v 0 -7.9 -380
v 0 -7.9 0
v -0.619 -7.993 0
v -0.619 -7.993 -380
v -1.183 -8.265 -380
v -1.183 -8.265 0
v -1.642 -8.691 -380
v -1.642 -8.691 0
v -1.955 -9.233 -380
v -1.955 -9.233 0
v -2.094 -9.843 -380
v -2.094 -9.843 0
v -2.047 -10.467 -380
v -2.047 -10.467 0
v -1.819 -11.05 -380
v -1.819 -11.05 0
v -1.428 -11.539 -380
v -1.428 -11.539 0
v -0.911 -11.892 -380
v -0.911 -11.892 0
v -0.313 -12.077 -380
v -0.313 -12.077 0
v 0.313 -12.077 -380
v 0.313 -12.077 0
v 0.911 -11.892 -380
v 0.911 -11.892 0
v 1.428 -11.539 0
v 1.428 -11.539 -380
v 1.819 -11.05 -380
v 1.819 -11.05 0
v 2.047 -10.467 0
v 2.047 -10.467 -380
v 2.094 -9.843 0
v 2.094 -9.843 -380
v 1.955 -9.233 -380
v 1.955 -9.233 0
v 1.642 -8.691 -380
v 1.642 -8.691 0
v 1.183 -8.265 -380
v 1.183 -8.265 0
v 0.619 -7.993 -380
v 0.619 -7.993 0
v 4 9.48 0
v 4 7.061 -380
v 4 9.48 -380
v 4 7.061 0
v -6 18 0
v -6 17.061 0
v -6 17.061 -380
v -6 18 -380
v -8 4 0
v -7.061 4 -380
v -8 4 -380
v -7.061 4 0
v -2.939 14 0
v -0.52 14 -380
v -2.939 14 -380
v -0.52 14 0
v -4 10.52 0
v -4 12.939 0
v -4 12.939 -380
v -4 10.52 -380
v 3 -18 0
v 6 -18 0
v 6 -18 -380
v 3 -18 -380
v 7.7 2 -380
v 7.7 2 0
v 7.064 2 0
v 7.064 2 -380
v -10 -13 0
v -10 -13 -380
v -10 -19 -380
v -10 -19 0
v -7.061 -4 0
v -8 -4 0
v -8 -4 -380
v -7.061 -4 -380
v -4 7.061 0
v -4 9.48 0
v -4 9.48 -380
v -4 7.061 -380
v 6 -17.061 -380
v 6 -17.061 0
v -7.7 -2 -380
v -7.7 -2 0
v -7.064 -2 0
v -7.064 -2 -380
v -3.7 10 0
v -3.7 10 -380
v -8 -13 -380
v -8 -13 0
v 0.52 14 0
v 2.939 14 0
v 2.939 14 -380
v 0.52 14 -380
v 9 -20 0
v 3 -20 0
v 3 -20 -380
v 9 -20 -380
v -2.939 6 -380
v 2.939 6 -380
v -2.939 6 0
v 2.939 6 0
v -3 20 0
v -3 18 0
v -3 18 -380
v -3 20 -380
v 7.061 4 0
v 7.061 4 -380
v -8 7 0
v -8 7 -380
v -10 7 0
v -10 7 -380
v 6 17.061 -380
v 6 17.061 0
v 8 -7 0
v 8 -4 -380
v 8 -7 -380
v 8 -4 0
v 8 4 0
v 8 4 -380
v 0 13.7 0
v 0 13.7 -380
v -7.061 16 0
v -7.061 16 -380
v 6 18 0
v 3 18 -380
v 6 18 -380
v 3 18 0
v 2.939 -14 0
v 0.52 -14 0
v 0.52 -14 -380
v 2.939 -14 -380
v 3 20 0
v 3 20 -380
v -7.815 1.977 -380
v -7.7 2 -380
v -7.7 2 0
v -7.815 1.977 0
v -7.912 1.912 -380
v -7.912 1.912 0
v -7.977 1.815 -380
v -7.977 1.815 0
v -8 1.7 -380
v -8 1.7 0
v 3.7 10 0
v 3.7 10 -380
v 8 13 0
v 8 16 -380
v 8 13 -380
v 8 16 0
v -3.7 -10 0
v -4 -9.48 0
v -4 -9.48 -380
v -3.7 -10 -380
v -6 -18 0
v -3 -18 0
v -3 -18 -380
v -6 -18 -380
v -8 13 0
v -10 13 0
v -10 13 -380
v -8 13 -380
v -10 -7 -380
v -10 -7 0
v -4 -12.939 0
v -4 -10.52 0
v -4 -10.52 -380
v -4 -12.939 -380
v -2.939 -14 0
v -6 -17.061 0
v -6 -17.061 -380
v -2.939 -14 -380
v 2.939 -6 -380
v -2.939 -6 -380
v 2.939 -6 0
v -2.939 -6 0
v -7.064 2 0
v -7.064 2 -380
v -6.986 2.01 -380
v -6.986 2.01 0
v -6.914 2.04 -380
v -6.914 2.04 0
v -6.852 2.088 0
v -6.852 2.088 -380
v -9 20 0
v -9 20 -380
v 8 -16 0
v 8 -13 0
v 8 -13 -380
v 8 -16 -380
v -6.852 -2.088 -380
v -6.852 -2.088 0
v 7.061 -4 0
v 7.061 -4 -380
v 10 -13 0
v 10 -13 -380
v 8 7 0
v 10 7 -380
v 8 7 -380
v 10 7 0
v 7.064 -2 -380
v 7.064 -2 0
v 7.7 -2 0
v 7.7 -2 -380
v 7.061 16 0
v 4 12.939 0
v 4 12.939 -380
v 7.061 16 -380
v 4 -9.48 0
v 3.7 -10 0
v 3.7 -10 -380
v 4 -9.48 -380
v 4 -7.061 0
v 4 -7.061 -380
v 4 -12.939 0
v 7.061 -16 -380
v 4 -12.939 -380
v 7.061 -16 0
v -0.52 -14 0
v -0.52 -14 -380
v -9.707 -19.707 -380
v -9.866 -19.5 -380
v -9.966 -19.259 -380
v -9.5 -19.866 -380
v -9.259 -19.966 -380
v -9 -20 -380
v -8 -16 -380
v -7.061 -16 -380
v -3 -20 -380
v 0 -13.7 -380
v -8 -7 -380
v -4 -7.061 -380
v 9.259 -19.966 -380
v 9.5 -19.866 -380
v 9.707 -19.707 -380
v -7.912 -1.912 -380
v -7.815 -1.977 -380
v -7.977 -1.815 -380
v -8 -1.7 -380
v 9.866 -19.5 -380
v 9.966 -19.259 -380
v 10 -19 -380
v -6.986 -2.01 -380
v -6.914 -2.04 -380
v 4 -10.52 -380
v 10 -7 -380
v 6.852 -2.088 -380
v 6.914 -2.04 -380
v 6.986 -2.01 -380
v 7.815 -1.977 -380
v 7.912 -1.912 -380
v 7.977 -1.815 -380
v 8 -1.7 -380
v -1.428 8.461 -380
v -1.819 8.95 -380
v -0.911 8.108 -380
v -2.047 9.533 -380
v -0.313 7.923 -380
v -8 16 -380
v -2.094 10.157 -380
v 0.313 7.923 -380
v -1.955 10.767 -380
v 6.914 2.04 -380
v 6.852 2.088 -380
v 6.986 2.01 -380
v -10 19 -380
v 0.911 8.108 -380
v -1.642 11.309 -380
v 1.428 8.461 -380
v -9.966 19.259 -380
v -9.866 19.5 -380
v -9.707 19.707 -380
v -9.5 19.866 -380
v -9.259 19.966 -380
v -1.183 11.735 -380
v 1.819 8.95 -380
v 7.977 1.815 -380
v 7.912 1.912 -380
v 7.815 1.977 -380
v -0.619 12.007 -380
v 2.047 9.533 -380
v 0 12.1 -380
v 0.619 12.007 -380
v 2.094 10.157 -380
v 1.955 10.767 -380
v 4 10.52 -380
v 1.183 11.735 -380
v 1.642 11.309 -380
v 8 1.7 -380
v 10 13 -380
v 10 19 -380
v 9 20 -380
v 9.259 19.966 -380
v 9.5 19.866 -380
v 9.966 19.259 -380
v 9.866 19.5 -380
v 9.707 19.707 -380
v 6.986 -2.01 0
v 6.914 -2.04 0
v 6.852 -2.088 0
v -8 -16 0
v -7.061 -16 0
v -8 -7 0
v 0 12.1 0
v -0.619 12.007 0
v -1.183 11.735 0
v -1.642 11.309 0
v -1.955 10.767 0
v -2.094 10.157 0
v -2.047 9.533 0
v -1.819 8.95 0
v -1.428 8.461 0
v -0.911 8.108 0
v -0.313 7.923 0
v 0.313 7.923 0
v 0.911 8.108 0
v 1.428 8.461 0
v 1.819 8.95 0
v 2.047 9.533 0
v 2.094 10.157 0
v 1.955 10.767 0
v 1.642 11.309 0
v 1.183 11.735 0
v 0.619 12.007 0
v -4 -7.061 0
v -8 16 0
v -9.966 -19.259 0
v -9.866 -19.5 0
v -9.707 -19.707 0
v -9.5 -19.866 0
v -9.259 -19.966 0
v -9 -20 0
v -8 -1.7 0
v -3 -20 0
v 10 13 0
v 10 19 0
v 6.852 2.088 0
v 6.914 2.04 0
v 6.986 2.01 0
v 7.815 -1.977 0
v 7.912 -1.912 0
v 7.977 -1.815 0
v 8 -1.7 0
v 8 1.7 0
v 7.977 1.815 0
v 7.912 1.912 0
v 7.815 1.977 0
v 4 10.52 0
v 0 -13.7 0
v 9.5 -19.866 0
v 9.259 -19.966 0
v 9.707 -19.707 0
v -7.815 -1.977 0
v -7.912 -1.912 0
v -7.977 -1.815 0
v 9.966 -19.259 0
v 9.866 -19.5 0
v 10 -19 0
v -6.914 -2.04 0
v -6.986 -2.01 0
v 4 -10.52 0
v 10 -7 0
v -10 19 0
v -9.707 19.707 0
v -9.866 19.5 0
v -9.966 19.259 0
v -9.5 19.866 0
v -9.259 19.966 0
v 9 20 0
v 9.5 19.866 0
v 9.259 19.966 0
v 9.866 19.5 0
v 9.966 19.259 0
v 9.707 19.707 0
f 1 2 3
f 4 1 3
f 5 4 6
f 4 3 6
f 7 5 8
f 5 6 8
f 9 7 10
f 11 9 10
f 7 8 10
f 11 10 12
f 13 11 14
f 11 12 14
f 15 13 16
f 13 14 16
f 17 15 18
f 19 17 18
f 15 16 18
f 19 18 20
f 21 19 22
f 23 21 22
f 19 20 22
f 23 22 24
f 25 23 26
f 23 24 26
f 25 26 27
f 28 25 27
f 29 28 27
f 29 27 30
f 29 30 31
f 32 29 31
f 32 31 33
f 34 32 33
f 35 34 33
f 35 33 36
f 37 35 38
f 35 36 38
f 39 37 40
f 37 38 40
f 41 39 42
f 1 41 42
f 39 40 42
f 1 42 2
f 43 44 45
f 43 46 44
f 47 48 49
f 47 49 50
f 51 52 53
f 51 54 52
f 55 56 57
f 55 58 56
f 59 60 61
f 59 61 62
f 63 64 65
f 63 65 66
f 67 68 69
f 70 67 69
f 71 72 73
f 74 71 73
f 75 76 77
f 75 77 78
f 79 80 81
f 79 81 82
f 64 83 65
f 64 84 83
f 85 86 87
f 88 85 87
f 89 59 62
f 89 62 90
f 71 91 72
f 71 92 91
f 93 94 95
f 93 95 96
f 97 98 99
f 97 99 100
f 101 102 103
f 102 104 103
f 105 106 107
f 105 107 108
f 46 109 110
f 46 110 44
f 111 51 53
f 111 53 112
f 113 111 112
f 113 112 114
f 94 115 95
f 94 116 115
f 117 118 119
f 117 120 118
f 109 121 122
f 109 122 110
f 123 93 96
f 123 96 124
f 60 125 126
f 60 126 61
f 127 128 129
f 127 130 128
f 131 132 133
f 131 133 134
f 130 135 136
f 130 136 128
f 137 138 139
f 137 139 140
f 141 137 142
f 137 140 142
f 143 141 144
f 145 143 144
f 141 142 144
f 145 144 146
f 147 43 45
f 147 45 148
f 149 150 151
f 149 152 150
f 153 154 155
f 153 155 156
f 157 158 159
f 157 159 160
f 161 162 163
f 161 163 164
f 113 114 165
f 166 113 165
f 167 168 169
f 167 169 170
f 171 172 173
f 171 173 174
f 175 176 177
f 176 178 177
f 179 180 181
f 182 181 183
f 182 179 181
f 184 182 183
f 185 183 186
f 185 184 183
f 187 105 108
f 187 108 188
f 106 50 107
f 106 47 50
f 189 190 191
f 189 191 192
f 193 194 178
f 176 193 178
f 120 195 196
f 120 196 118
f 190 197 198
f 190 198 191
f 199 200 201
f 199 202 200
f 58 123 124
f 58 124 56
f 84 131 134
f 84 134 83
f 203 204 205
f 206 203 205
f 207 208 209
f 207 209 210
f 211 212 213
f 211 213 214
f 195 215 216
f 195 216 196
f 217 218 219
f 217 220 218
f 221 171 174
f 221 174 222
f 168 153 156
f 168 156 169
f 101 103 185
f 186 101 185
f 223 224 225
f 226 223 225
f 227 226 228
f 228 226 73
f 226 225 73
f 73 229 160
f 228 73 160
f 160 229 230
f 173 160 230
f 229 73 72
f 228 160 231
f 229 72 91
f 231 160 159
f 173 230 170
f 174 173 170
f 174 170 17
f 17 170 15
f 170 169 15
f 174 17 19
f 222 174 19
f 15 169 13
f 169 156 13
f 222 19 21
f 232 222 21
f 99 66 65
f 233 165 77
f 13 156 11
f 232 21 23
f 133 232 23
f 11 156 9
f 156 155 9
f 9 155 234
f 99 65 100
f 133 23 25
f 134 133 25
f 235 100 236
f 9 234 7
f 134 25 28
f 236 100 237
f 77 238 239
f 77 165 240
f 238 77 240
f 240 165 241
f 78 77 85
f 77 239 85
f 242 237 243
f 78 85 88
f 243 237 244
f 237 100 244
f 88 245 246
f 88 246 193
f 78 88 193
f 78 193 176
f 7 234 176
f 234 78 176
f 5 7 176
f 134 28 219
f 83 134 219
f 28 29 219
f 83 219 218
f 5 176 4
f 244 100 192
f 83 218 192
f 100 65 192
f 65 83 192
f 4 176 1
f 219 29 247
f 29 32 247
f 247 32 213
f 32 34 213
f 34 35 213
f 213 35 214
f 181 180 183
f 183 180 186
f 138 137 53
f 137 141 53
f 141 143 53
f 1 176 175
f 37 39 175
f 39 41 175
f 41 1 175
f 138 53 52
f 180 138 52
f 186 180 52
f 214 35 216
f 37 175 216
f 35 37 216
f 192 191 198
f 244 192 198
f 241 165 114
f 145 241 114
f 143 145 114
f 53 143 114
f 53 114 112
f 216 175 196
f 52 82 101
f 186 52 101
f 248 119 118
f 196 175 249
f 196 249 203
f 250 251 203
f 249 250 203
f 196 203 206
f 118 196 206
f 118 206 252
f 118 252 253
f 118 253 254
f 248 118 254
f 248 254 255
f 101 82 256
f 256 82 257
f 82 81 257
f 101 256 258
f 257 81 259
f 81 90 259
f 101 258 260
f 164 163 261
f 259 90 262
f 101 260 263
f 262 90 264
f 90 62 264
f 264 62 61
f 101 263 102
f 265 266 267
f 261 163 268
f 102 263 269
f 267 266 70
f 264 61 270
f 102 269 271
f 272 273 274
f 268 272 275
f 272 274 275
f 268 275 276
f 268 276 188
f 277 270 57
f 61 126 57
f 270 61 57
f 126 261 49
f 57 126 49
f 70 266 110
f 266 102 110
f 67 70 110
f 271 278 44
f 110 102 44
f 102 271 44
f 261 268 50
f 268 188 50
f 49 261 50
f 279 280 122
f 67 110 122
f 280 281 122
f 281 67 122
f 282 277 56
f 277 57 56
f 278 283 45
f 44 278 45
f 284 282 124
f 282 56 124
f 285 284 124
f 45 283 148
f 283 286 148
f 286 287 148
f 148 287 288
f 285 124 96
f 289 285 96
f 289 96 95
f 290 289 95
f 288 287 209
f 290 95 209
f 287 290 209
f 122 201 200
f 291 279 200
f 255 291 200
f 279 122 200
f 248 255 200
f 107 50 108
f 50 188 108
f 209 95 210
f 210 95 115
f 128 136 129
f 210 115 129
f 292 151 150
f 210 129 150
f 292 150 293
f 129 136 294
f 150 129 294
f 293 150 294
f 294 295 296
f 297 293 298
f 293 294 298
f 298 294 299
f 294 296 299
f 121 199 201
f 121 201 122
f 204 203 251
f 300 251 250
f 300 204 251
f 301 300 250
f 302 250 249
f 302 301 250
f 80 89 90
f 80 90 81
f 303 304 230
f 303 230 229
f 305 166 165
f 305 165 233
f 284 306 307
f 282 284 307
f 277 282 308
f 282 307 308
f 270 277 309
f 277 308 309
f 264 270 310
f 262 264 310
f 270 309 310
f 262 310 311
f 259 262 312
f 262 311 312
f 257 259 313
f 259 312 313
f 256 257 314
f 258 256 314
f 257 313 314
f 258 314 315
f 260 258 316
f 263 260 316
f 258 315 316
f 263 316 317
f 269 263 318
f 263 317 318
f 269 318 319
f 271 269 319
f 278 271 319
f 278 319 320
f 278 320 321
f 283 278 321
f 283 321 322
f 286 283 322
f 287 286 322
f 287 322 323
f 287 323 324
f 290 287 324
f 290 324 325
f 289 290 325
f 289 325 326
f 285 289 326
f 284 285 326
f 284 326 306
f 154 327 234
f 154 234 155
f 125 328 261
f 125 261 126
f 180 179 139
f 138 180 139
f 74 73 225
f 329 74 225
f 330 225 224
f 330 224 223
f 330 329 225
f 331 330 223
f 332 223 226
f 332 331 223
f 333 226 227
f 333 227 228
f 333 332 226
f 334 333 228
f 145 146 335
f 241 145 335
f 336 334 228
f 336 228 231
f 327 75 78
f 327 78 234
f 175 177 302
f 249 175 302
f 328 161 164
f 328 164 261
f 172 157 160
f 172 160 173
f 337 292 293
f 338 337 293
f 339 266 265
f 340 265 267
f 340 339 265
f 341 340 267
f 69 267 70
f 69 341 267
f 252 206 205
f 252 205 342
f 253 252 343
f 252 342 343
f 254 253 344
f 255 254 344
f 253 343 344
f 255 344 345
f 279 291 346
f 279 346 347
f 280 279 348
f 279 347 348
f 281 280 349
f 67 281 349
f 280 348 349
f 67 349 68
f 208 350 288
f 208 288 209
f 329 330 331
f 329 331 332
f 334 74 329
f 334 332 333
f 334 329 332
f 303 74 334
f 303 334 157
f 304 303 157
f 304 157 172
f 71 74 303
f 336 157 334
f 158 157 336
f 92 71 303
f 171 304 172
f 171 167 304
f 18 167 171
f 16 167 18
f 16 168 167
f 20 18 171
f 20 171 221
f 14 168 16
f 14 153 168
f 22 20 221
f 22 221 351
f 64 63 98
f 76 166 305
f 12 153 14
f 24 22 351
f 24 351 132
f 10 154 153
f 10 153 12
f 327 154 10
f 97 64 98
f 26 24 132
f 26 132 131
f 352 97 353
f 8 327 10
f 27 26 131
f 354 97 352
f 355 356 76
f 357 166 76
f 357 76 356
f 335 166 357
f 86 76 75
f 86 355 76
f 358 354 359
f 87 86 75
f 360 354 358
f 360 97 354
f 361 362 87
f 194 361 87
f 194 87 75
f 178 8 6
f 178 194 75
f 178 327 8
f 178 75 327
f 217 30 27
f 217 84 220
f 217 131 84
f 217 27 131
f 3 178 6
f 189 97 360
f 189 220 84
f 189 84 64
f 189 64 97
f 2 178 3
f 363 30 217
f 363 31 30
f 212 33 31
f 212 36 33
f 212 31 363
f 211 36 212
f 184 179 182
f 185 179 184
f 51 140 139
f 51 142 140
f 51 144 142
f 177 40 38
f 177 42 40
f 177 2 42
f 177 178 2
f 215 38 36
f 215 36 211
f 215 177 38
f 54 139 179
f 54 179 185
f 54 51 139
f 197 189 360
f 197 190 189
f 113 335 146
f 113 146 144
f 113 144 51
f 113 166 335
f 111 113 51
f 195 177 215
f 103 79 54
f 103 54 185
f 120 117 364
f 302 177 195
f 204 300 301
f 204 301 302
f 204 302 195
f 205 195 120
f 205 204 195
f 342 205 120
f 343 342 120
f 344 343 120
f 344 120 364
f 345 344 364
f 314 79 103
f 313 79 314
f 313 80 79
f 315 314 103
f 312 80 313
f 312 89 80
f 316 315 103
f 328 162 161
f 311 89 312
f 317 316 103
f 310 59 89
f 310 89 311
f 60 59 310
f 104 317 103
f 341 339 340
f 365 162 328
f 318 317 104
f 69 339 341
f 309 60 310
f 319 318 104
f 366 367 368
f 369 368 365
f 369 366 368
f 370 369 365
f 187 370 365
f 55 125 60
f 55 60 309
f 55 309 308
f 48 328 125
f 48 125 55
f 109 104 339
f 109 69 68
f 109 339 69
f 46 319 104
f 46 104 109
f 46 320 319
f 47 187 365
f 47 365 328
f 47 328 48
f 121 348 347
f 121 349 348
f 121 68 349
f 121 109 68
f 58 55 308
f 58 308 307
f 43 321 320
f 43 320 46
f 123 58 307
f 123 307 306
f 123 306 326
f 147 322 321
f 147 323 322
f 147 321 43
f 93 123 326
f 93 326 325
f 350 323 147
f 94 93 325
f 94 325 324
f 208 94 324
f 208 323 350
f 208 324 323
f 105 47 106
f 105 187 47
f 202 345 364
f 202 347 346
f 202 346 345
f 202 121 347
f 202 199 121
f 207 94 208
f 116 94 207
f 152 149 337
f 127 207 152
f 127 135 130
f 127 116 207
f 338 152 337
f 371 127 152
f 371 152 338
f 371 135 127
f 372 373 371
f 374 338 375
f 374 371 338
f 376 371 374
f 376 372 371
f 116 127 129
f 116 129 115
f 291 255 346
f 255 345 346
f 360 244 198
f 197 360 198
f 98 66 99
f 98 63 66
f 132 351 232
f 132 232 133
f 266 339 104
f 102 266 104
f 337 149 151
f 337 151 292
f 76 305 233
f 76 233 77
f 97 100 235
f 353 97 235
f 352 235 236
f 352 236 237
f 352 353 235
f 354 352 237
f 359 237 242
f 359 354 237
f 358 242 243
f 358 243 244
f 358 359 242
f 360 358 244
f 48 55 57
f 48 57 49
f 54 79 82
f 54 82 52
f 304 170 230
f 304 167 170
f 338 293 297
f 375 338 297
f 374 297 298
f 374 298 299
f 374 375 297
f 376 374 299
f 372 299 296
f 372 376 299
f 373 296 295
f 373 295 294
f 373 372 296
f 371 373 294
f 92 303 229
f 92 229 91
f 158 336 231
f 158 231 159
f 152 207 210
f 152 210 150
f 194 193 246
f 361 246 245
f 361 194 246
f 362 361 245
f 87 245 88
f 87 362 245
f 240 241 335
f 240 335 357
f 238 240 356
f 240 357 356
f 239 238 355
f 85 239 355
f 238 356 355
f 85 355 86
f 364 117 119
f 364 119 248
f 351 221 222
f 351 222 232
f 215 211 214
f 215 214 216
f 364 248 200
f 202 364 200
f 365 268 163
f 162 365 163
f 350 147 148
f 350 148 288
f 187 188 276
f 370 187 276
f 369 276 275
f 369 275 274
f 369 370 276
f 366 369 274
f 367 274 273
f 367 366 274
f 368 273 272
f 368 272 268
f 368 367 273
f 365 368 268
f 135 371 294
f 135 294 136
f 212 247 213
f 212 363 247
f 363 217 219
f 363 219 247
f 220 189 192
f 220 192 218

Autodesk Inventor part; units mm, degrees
sketch "Sketch_1" plane through (0, 0, 0) normal (0, 0, 1) x (1, 0, 0)
  line L0 (-10, -7) -> (-8, -7)
  line L1 (-8, -7) -> (-8, -4)
  line L2 (-8, -4) -> (-7.0607, -4)
  line L3 (-7.0607, -4) -> (-4, -7.0607)
  line L4 (-4, -7.0607) -> (-4, -9.4804)
  line L5 (-4, -9.4804) -> (-3.7, -10)
  line L6 (-3.7, -10) -> (-4, -10.5196)
  line L7 (-4, -10.5196) -> (-4, -12.9393)
  line L8 (-4, -12.9393) -> (-7.0607, -16)
  line L9 (-7.0607, -16) -> (-8, -16)
  line L10 (-8, -16) -> (-8, -13)
  line L11 (-8, -13) -> (-10, -13)
  line L12 (-10, -13) -> (-10, -19)
  arc A0 (-10, -19) -> (-9, -20) centre (-9, -19) ccw
  line L13 (-9, -20) -> (-3, -20)
  line L14 (-3, -20) -> (-3, -18)
  line L15 (-3, -18) -> (-6, -18)
  line L16 (-6, -18) -> (-6, -17.0607)
  line L17 (-6, -17.0607) -> (-2.9393, -14)
  line L18 (-2.9393, -14) -> (-0.5196, -14)
  line L19 (-0.5196, -14) -> (0, -13.7)
  line L20 (0, -13.7) -> (0.5196, -14)
  line L21 (0.5196, -14) -> (2.9393, -14)
  line L22 (2.9393, -14) -> (6, -17.0607)
  line L23 (6, -17.0607) -> (6, -18)
  line L24 (6, -18) -> (3, -18)
  line L25 (3, -18) -> (3, -20)
  line L26 (3, -20) -> (9, -20)
  arc A1 (9, -20) -> (10, -19) centre (9, -19) ccw
  line L27 (10, -19) -> (10, -13)
  line L28 (10, -13) -> (8, -13)
  line L29 (8, -13) -> (8, -16)
  line L30 (8, -16) -> (7.0607, -16)
  line L31 (7.0607, -16) -> (4, -12.9393)
  line L32 (4, -12.9393) -> (4, -10.5196)
  line L33 (4, -10.5196) -> (3.7, -10)
  line L34 (3.7, -10) -> (4, -9.4804)
  line L35 (4, -9.4804) -> (4, -7.0607)
  line L36 (4, -7.0607) -> (7.0607, -4)
  line L37 (7.0607, -4) -> (8, -4)
  line L38 (8, -4) -> (8, -7)
  line L39 (8, -7) -> (10, -7)
  line L40 (10, -7) -> (10, 7)
  line L41 (10, 7) -> (8, 7)
  line L42 (8, 7) -> (8, 4)
  line L43 (8, 4) -> (7.0607, 4)
  line L44 (7.0607, 4) -> (4, 7.0607)
  line L45 (4, 7.0607) -> (4, 9.4804)
  line L46 (4, 9.4804) -> (3.7, 10)
  line L47 (3.7, 10) -> (4, 10.5196)
  line L48 (4, 10.5196) -> (4, 12.9393)
  line L49 (4, 12.9393) -> (7.0607, 16)
  line L50 (7.0607, 16) -> (8, 16)
  line L51 (8, 16) -> (8, 13)
  line L52 (8, 13) -> (10, 13)
  line L53 (10, 13) -> (10, 19)
  arc A2 (10, 19) -> (9, 20) centre (9, 19) ccw
  line L54 (9, 20) -> (3, 20)
  line L55 (3, 20) -> (3, 18)
  line L56 (3, 18) -> (6, 18)
  line L57 (6, 18) -> (6, 17.0607)
  line L58 (6, 17.0607) -> (2.9393, 14)
  line L59 (2.9393, 14) -> (0.5196, 14)
  line L60 (0.5196, 14) -> (0, 13.7)
  line L61 (0, 13.7) -> (-0.5196, 14)
  line L62 (-0.5196, 14) -> (-2.9393, 14)
  line L63 (-2.9393, 14) -> (-6, 17.0607)
  line L64 (-6, 17.0607) -> (-6, 18)
  line L65 (-6, 18) -> (-3, 18)
  line L66 (-3, 18) -> (-3, 20)
  line L67 (-3, 20) -> (-9, 20)
  arc A3 (-9, 20) -> (-10, 19) centre (-9, 19) ccw
  line L68 (-10, 19) -> (-10, 13)
  line L69 (-10, 13) -> (-8, 13)
  line L70 (-8, 13) -> (-8, 16)
  line L71 (-8, 16) -> (-7.0607, 16)
  line L72 (-7.0607, 16) -> (-4, 12.9393)
  line L73 (-4, 12.9393) -> (-4, 10.5196)
  line L74 (-4, 10.5196) -> (-3.7, 10)
  line L75 (-3.7, 10) -> (-4, 9.4804)
  line L76 (-4, 9.4804) -> (-4, 7.0607)
  line L77 (-4, 7.0607) -> (-7.0607, 4)
  line L78 (-7.0607, 4) -> (-8, 4)
  line L79 (-8, 4) -> (-8, 7)
  line L80 (-8, 7) -> (-10, 7)
  line L81 (-10, 7) -> (-10, -7)
  line L82 (-8, 1.7) -> (-8, -1.7)
  arc A4 (-8, -1.7) -> (-7.7, -2) centre (-7.7, -1.7) ccw
  line L83 (-7.7, -2) -> (-7.0636, -2)
  arc A5 (-6.8515, -2.0879) -> (-7.0636, -2) centre (-7.0636, -2.3) ccw
  line L84 (-6.8515, -2.0879) -> (-2.9393, -6)
  line L85 (-2.9393, -6) -> (2.9393, -6)
  line L86 (2.9393, -6) -> (6.8515, -2.0879)
  arc A6 (7.0636, -2) -> (6.8515, -2.0879) centre (7.0636, -2.3) ccw
  line L87 (7.0636, -2) -> (7.7, -2)
  arc A7 (7.7, -2) -> (8, -1.7) centre (7.7, -1.7) ccw
  line L88 (8, -1.7) -> (8, 1.7)
  arc A8 (8, 1.7) -> (7.7, 2) centre (7.7, 1.7) ccw
  line L89 (7.7, 2) -> (7.0636, 2)
  arc A9 (6.8515, 2.0879) -> (7.0636, 2) centre (7.0636, 2.3) ccw
  line L90 (6.8515, 2.0879) -> (2.9393, 6)
  line L91 (2.9393, 6) -> (-2.9393, 6)
  line L92 (-2.9393, 6) -> (-6.8515, 2.0879)
  arc A10 (-7.0636, 2) -> (-6.8515, 2.0879) centre (-7.0636, 2.3) ccw
  line L93 (-7.0636, 2) -> (-7.7, 2)
  arc A11 (-7.7, 2) -> (-8, 1.7) centre (-7.7, 1.7) ccw
extrude "Extrusion1" add sketch "Sketch_1" against normal blind 380
sketch "Sketch2" plane through (0, 0, -380) normal (0, 0, -1) x (-1, 0, 0)
  point P0 (0, 10)
hole "Hole1" at (0, 10, -380) direction (0, 0, 1) diameter 4.2 depth 380
pattern_linear "Rectangular Pattern1" count 2 spacing 20 along (0, -1, 0) of "Hole1"
ref_plane "C1_XY" through (0, 0, 0) normal (0, 0, 1) x (1, 0, 0)
ref_plane "C1_YZ" through (0, 0, 0) normal (1, 0, 0) x (0, 1, 0)
ref_plane "C1_ZX" through (0, 0, 0) normal (0, 1, 0) x (0, 0, 1)
properties part number "HFS5-2040-380"
